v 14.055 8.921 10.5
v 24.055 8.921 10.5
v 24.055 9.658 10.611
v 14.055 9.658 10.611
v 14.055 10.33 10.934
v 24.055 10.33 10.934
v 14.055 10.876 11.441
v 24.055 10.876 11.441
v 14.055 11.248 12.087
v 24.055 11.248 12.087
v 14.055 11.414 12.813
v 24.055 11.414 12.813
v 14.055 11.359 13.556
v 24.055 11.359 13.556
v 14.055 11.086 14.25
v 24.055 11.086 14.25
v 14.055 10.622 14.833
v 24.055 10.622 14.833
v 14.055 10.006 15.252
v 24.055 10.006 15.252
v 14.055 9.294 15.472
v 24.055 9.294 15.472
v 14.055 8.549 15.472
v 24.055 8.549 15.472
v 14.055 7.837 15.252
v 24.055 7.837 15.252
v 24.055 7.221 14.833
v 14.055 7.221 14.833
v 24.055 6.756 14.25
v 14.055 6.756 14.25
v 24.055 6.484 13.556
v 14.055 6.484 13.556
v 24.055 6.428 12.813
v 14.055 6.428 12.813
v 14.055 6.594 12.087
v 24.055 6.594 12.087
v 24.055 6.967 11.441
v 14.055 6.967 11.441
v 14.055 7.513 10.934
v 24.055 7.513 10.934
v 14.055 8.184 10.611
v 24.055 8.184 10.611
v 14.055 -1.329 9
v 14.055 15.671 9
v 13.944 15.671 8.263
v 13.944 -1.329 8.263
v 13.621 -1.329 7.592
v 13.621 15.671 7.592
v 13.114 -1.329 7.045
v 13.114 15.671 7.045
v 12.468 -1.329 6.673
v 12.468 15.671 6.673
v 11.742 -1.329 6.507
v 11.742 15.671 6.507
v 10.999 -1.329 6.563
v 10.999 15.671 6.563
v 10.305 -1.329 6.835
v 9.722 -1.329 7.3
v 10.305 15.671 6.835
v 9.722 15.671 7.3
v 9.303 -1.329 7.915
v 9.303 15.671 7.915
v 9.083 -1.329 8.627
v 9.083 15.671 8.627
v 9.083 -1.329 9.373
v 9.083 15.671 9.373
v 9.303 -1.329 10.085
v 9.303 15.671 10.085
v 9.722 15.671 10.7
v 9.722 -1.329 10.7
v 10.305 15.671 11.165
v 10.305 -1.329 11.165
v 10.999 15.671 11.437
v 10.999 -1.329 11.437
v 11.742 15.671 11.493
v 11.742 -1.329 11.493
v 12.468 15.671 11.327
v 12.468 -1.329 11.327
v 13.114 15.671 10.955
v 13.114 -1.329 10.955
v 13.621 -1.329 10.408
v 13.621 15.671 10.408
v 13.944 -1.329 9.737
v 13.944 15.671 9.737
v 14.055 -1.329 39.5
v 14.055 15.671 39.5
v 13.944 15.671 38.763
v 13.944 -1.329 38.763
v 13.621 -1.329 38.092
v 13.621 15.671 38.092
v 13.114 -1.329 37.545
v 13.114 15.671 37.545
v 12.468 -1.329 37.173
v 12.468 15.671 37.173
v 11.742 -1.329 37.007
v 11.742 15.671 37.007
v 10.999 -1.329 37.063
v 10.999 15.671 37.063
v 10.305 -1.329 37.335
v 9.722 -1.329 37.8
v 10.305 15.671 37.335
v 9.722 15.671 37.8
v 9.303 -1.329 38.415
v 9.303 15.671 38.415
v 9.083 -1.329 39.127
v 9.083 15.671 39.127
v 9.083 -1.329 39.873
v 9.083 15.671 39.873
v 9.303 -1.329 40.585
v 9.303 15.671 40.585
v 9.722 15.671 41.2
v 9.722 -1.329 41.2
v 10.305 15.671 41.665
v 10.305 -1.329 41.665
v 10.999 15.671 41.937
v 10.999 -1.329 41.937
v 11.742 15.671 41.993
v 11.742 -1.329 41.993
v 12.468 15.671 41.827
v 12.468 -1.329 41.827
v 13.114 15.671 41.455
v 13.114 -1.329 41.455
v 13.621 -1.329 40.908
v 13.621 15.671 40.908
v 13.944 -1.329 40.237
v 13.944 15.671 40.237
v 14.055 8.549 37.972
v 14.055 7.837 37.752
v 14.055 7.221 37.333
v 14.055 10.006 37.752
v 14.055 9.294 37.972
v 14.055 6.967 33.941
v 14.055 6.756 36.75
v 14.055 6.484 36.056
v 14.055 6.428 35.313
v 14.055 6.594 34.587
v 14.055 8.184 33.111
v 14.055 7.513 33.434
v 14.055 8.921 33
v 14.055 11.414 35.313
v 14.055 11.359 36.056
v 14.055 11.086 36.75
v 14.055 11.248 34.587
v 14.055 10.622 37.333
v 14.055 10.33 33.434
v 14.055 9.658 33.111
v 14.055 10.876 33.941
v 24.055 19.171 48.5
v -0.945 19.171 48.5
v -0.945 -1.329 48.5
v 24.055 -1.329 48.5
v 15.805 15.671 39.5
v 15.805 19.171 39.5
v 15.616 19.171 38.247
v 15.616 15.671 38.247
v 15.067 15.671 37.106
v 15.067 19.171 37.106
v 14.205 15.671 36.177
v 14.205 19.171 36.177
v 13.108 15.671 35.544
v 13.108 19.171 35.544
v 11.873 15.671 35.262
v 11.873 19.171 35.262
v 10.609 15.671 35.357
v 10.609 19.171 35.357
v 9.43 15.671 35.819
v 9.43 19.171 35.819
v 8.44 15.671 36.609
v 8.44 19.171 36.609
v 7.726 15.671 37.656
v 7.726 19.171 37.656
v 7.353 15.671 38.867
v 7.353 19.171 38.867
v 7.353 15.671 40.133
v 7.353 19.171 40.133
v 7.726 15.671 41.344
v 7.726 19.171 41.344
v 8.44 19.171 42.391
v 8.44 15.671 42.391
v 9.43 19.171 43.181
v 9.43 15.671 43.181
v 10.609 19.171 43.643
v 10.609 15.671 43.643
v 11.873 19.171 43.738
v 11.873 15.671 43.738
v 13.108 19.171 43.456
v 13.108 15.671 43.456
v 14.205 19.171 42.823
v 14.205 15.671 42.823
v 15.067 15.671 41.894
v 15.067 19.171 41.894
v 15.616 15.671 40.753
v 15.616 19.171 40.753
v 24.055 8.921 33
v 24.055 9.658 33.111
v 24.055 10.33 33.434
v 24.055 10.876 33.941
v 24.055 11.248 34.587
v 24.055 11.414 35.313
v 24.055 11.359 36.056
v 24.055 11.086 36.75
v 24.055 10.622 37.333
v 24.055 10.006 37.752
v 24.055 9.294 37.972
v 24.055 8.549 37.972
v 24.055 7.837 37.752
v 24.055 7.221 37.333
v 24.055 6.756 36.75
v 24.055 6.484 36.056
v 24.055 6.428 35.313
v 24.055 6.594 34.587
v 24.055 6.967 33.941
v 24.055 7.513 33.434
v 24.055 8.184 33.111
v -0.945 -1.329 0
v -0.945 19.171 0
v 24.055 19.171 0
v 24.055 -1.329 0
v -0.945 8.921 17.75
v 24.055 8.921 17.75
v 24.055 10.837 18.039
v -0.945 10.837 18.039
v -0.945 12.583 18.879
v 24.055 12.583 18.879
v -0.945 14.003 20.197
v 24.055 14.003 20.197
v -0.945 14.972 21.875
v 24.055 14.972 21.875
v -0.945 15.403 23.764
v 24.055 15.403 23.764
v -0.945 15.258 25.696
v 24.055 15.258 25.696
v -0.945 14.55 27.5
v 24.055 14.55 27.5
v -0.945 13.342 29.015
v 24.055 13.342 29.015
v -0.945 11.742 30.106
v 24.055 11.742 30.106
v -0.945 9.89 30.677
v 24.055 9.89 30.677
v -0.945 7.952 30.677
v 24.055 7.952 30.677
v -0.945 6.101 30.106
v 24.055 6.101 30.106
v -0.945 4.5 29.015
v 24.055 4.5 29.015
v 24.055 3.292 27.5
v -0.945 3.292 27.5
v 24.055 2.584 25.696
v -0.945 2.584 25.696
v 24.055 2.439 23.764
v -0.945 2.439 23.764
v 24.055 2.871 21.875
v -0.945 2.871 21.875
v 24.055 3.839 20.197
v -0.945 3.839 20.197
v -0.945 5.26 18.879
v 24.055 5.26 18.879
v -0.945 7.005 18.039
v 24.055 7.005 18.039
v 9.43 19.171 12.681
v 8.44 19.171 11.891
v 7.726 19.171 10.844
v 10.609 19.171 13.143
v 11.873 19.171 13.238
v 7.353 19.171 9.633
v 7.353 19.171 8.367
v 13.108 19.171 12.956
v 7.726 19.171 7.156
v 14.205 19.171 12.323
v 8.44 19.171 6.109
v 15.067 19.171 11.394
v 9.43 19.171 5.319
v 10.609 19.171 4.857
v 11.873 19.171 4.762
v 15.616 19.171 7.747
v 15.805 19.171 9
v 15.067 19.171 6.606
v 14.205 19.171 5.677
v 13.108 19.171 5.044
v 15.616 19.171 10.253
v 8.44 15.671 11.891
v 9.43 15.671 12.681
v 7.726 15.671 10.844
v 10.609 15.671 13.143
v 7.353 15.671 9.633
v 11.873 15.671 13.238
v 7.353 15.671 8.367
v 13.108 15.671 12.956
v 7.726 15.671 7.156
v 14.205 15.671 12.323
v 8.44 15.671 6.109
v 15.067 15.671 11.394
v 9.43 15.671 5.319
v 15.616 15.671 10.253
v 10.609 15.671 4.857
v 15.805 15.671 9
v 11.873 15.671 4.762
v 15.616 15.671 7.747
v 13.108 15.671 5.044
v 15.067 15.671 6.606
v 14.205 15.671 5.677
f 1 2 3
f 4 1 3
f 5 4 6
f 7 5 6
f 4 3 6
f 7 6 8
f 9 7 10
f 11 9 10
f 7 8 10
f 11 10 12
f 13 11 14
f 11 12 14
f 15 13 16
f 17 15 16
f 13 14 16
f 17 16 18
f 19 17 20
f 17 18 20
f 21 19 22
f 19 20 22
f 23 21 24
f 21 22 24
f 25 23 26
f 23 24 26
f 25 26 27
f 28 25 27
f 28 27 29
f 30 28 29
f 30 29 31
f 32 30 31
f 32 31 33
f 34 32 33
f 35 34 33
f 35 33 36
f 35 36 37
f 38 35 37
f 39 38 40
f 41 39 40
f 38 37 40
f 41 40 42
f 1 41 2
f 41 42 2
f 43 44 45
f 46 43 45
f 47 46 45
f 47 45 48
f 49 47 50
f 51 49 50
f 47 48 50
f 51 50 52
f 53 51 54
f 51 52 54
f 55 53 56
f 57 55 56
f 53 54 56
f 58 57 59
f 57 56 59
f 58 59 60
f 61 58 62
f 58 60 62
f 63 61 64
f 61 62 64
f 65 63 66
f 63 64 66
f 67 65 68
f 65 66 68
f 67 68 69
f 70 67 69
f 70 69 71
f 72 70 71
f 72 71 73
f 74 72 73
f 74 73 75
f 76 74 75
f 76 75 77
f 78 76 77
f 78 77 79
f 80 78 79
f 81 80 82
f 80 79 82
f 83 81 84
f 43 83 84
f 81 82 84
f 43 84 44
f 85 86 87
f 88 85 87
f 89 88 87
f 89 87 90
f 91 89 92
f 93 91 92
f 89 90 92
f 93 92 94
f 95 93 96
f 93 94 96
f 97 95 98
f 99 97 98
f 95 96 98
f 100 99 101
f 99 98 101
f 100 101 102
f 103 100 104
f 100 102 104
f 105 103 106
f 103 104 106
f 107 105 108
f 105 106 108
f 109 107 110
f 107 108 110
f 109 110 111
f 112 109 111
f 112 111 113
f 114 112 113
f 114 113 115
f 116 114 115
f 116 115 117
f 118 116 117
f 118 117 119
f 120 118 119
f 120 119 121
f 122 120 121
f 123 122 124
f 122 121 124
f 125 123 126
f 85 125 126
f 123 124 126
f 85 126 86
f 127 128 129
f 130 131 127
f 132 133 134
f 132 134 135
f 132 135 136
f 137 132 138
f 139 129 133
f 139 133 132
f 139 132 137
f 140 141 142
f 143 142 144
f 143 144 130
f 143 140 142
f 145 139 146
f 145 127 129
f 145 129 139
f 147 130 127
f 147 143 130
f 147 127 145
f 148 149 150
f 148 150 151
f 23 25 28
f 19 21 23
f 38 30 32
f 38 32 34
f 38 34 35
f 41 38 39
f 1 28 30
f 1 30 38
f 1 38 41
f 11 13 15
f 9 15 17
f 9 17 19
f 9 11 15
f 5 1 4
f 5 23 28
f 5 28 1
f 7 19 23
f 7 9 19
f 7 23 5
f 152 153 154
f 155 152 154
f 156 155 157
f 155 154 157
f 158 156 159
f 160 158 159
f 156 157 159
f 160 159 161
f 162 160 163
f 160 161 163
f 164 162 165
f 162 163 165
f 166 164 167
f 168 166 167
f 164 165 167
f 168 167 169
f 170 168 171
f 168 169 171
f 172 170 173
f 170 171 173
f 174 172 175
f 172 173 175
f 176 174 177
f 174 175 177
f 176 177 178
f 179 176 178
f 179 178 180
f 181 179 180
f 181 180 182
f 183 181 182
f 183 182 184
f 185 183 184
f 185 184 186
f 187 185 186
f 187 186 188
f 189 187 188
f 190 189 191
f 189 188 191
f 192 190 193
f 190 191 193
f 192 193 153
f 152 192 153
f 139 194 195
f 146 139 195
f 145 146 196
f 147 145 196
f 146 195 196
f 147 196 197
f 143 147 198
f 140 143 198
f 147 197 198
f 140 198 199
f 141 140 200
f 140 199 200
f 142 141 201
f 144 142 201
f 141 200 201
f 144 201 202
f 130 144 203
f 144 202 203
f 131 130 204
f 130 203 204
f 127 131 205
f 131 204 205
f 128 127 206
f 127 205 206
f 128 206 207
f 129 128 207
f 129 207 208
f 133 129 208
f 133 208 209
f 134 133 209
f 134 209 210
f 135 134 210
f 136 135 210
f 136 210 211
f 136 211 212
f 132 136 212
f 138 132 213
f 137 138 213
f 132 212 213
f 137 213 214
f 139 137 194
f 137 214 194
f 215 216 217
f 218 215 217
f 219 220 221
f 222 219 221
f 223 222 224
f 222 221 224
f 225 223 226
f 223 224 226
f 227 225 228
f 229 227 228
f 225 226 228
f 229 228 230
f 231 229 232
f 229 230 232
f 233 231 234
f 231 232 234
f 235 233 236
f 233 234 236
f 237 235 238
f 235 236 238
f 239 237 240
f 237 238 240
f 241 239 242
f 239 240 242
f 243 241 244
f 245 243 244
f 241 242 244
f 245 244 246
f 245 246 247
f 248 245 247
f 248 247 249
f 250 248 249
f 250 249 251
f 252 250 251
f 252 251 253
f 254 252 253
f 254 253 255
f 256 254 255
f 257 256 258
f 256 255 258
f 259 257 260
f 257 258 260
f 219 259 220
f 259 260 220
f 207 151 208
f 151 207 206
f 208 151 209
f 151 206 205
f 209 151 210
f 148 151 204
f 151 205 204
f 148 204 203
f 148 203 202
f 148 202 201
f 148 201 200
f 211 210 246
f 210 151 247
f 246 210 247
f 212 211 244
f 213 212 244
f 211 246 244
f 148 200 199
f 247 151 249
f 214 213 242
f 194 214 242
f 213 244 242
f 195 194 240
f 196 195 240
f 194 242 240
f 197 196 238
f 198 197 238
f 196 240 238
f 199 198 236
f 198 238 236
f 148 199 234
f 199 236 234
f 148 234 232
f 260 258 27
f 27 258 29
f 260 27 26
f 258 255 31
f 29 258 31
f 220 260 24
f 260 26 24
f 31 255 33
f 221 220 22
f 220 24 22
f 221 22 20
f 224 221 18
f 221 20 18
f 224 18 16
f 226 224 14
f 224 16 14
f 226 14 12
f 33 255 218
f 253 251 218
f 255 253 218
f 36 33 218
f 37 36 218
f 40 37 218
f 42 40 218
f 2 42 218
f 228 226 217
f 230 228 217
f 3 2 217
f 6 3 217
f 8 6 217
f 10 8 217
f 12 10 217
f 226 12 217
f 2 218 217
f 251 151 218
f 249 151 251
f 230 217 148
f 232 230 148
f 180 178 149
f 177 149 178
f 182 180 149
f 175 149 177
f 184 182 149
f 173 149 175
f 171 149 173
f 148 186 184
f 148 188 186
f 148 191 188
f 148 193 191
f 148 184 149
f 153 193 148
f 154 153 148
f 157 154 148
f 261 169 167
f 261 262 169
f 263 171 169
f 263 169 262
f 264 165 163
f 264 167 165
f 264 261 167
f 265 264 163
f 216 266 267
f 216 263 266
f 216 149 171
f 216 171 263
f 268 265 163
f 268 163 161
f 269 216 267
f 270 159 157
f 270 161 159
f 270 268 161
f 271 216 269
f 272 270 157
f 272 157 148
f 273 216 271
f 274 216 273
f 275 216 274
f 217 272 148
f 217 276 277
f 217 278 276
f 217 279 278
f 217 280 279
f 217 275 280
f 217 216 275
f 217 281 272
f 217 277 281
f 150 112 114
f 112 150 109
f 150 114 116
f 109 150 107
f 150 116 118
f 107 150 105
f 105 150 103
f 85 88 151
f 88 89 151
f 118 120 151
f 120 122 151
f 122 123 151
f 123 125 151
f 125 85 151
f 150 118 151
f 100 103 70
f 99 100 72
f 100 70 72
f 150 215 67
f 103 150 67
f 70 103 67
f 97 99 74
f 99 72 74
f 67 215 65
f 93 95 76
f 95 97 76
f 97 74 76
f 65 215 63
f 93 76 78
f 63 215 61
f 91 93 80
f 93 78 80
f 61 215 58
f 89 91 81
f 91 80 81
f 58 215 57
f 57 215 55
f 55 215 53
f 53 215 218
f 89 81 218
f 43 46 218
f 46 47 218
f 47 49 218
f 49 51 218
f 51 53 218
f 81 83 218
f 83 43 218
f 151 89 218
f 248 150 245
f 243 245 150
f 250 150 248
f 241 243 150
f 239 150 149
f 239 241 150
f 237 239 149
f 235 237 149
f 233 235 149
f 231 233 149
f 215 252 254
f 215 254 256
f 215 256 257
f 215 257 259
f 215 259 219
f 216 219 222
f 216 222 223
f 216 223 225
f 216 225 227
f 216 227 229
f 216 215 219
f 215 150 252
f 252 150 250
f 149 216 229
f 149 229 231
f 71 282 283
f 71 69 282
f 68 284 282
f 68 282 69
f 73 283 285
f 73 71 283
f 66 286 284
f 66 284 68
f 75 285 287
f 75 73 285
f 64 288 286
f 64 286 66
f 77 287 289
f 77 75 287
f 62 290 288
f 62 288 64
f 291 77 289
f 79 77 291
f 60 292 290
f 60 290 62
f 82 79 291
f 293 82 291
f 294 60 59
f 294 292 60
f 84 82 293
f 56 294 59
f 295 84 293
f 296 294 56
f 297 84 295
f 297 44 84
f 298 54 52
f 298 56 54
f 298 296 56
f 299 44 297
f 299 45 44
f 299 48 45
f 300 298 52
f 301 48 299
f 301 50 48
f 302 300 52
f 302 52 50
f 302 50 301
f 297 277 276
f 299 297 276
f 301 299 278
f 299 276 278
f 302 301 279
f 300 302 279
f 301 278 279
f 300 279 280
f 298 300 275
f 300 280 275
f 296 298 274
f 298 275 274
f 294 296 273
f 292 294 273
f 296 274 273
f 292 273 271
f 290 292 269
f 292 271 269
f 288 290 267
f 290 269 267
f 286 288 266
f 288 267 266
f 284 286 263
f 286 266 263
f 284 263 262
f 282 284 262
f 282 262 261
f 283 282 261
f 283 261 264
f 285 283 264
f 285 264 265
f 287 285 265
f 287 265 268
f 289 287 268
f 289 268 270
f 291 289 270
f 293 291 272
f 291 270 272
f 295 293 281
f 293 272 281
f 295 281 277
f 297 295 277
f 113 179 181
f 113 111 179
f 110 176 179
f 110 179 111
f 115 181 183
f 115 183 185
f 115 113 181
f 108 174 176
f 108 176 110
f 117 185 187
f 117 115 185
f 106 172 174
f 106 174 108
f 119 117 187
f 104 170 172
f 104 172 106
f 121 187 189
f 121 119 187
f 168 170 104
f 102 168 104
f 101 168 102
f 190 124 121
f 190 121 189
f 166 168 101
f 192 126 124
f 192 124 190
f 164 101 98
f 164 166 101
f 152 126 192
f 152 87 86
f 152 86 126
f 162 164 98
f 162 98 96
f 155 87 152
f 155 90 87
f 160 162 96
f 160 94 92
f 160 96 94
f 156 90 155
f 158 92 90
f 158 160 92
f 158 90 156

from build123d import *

# Parameters (mm, degrees)
SKETCH1_W           = 25
SKETCH1_H           = 20.5
BOSS_EXTRUDE1_DEPTH = 48.5
SKETCH2_R           = 4.25
CUT_EXTRUDE1_DEPTH  = 3.5
SKETCH3_R           = 2.5
CUT_EXTRUDE2_DEPTH  = 17
SKETCH4_R           = 6.5
CUT_EXTRUDE3_DEPTH  = 25
SKETCH5_R           = 2.5
CUT_EXTRUDE4_DEPTH  = 10


with BuildPart() as part:
    # Sketch1 → Boss-Extrude1 (new body)
    with BuildSketch(Plane.XY):
        with Locations((11.55511811, 8.921259843)):
            Rectangle(SKETCH1_W, SKETCH1_H)
    extrude(amount=BOSS_EXTRUDE1_DEPTH)

    # Sketch2 → Cut-Extrude1 (cut)
    with BuildSketch(Plane(origin=(0, 19.171259843, 0), x_dir=(1, 0, 0), z_dir=(0, 1, 0))):
        with Locations((11.55511811, -39.5)):
            Circle(SKETCH2_R)
        with Locations((11.55511811, -9)):
            Circle(SKETCH2_R)
    extrude(amount=-CUT_EXTRUDE1_DEPTH, mode=Mode.SUBTRACT)

    # Sketch3 → Cut-Extrude2 (cut)
    with BuildSketch(Plane(origin=(0, 15.671259843, 0), x_dir=(1, 0, 0), z_dir=(0, 1, 0))):
        with Locations((11.55511811, -39.5)):
            Circle(SKETCH3_R)
        with Locations((11.55511811, -9)):
            Circle(SKETCH3_R)
    extrude(amount=-CUT_EXTRUDE2_DEPTH, mode=Mode.SUBTRACT)

    # Sketch4 → Cut-Extrude3 (cut)
    with BuildSketch(Plane(origin=(24.05511811, 0, 0), x_dir=(0, 0, -1), z_dir=(1, 0, 0))):
        with Locations((-24.25, 8.921259843)):
            Circle(SKETCH4_R)
    extrude(amount=-CUT_EXTRUDE3_DEPTH, mode=Mode.SUBTRACT)

    # Sketch5 → Cut-Extrude4 (cut)
    with BuildSketch(Plane(origin=(24.05511811, 0, 0), x_dir=(0, 0, -1), z_dir=(1, 0, 0))):
        with Locations((-13, 8.921259843)):
            Circle(SKETCH5_R)
        with Locations((-35.5, 8.921259843)):
            Circle(SKETCH5_R)
    extrude(amount=-CUT_EXTRUDE4_DEPTH, mode=Mode.SUBTRACT)


solid = part.part
